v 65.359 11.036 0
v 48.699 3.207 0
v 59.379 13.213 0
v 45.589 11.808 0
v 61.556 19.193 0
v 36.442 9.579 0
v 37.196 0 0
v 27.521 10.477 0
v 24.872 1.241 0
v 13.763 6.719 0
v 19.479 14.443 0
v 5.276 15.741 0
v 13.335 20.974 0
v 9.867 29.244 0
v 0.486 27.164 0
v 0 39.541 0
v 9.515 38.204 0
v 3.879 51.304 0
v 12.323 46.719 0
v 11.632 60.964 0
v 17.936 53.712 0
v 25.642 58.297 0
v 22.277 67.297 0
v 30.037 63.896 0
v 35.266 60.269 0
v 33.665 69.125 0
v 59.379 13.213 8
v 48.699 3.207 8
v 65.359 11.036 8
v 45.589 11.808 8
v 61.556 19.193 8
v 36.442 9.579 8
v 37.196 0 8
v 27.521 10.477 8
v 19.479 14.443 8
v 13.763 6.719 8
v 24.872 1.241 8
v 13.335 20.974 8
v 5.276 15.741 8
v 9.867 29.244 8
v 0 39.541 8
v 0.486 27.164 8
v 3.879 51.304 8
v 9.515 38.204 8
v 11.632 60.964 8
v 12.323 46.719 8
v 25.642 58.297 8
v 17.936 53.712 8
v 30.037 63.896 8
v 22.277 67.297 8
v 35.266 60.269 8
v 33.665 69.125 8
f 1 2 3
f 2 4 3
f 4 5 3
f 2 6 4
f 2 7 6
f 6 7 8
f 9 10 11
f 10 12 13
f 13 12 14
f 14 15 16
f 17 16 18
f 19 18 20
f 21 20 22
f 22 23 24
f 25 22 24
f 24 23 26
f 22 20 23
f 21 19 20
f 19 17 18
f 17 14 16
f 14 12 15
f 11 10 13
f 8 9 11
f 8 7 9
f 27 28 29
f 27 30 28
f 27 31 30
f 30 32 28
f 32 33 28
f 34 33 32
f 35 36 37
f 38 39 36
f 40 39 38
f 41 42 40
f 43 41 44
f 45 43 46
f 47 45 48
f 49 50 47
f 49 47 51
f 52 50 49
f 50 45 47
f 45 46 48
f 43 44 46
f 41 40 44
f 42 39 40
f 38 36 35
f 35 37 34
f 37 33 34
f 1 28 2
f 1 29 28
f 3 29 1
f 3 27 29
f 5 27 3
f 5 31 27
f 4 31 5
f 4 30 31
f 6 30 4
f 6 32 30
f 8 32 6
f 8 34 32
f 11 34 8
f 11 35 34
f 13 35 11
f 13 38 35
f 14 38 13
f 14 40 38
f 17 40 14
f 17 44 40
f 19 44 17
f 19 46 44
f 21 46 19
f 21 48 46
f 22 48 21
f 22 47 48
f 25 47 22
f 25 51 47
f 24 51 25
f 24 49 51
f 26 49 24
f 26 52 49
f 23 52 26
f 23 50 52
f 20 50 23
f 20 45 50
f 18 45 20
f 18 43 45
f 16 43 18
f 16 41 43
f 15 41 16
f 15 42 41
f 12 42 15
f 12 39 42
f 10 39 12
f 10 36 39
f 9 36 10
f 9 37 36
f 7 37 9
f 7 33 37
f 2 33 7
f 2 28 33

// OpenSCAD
$fn = 32;

// ----------------------------------------------------------------------
// Hook plate: curl radius 30 mm over 205 degrees, 9 mm thick band
// ----------------------------------------------------------------------

// --- parameters (mm) ---
profile_height = 8;       // extrusion height
profile_points = 26;      // points of the closed outline

profile = [[30.037, 63.896], [33.665, 69.125], [22.277, 67.297], [11.632, 60.964], [3.879, 51.304], [0, 39.541], [0.486, 27.164], [5.276, 15.741], [13.763, 6.719], [24.872, 1.241], [37.196, 0], [48.699, 3.207], [65.359, 11.036], [59.379, 13.213], [61.556, 19.193], [45.589, 11.808], [36.442, 9.579], [27.521, 10.477], [19.479, 14.443], [13.335, 20.974], [9.867, 29.244], [9.515, 38.204], [12.323, 46.719], [17.936, 53.712], [25.642, 58.297], [35.266, 60.269]];  // single closed polygon, 26 points, counter clockwise

// --- the one profile operation ---
linear_extrude(height = profile_height) polygon(points = profile);
